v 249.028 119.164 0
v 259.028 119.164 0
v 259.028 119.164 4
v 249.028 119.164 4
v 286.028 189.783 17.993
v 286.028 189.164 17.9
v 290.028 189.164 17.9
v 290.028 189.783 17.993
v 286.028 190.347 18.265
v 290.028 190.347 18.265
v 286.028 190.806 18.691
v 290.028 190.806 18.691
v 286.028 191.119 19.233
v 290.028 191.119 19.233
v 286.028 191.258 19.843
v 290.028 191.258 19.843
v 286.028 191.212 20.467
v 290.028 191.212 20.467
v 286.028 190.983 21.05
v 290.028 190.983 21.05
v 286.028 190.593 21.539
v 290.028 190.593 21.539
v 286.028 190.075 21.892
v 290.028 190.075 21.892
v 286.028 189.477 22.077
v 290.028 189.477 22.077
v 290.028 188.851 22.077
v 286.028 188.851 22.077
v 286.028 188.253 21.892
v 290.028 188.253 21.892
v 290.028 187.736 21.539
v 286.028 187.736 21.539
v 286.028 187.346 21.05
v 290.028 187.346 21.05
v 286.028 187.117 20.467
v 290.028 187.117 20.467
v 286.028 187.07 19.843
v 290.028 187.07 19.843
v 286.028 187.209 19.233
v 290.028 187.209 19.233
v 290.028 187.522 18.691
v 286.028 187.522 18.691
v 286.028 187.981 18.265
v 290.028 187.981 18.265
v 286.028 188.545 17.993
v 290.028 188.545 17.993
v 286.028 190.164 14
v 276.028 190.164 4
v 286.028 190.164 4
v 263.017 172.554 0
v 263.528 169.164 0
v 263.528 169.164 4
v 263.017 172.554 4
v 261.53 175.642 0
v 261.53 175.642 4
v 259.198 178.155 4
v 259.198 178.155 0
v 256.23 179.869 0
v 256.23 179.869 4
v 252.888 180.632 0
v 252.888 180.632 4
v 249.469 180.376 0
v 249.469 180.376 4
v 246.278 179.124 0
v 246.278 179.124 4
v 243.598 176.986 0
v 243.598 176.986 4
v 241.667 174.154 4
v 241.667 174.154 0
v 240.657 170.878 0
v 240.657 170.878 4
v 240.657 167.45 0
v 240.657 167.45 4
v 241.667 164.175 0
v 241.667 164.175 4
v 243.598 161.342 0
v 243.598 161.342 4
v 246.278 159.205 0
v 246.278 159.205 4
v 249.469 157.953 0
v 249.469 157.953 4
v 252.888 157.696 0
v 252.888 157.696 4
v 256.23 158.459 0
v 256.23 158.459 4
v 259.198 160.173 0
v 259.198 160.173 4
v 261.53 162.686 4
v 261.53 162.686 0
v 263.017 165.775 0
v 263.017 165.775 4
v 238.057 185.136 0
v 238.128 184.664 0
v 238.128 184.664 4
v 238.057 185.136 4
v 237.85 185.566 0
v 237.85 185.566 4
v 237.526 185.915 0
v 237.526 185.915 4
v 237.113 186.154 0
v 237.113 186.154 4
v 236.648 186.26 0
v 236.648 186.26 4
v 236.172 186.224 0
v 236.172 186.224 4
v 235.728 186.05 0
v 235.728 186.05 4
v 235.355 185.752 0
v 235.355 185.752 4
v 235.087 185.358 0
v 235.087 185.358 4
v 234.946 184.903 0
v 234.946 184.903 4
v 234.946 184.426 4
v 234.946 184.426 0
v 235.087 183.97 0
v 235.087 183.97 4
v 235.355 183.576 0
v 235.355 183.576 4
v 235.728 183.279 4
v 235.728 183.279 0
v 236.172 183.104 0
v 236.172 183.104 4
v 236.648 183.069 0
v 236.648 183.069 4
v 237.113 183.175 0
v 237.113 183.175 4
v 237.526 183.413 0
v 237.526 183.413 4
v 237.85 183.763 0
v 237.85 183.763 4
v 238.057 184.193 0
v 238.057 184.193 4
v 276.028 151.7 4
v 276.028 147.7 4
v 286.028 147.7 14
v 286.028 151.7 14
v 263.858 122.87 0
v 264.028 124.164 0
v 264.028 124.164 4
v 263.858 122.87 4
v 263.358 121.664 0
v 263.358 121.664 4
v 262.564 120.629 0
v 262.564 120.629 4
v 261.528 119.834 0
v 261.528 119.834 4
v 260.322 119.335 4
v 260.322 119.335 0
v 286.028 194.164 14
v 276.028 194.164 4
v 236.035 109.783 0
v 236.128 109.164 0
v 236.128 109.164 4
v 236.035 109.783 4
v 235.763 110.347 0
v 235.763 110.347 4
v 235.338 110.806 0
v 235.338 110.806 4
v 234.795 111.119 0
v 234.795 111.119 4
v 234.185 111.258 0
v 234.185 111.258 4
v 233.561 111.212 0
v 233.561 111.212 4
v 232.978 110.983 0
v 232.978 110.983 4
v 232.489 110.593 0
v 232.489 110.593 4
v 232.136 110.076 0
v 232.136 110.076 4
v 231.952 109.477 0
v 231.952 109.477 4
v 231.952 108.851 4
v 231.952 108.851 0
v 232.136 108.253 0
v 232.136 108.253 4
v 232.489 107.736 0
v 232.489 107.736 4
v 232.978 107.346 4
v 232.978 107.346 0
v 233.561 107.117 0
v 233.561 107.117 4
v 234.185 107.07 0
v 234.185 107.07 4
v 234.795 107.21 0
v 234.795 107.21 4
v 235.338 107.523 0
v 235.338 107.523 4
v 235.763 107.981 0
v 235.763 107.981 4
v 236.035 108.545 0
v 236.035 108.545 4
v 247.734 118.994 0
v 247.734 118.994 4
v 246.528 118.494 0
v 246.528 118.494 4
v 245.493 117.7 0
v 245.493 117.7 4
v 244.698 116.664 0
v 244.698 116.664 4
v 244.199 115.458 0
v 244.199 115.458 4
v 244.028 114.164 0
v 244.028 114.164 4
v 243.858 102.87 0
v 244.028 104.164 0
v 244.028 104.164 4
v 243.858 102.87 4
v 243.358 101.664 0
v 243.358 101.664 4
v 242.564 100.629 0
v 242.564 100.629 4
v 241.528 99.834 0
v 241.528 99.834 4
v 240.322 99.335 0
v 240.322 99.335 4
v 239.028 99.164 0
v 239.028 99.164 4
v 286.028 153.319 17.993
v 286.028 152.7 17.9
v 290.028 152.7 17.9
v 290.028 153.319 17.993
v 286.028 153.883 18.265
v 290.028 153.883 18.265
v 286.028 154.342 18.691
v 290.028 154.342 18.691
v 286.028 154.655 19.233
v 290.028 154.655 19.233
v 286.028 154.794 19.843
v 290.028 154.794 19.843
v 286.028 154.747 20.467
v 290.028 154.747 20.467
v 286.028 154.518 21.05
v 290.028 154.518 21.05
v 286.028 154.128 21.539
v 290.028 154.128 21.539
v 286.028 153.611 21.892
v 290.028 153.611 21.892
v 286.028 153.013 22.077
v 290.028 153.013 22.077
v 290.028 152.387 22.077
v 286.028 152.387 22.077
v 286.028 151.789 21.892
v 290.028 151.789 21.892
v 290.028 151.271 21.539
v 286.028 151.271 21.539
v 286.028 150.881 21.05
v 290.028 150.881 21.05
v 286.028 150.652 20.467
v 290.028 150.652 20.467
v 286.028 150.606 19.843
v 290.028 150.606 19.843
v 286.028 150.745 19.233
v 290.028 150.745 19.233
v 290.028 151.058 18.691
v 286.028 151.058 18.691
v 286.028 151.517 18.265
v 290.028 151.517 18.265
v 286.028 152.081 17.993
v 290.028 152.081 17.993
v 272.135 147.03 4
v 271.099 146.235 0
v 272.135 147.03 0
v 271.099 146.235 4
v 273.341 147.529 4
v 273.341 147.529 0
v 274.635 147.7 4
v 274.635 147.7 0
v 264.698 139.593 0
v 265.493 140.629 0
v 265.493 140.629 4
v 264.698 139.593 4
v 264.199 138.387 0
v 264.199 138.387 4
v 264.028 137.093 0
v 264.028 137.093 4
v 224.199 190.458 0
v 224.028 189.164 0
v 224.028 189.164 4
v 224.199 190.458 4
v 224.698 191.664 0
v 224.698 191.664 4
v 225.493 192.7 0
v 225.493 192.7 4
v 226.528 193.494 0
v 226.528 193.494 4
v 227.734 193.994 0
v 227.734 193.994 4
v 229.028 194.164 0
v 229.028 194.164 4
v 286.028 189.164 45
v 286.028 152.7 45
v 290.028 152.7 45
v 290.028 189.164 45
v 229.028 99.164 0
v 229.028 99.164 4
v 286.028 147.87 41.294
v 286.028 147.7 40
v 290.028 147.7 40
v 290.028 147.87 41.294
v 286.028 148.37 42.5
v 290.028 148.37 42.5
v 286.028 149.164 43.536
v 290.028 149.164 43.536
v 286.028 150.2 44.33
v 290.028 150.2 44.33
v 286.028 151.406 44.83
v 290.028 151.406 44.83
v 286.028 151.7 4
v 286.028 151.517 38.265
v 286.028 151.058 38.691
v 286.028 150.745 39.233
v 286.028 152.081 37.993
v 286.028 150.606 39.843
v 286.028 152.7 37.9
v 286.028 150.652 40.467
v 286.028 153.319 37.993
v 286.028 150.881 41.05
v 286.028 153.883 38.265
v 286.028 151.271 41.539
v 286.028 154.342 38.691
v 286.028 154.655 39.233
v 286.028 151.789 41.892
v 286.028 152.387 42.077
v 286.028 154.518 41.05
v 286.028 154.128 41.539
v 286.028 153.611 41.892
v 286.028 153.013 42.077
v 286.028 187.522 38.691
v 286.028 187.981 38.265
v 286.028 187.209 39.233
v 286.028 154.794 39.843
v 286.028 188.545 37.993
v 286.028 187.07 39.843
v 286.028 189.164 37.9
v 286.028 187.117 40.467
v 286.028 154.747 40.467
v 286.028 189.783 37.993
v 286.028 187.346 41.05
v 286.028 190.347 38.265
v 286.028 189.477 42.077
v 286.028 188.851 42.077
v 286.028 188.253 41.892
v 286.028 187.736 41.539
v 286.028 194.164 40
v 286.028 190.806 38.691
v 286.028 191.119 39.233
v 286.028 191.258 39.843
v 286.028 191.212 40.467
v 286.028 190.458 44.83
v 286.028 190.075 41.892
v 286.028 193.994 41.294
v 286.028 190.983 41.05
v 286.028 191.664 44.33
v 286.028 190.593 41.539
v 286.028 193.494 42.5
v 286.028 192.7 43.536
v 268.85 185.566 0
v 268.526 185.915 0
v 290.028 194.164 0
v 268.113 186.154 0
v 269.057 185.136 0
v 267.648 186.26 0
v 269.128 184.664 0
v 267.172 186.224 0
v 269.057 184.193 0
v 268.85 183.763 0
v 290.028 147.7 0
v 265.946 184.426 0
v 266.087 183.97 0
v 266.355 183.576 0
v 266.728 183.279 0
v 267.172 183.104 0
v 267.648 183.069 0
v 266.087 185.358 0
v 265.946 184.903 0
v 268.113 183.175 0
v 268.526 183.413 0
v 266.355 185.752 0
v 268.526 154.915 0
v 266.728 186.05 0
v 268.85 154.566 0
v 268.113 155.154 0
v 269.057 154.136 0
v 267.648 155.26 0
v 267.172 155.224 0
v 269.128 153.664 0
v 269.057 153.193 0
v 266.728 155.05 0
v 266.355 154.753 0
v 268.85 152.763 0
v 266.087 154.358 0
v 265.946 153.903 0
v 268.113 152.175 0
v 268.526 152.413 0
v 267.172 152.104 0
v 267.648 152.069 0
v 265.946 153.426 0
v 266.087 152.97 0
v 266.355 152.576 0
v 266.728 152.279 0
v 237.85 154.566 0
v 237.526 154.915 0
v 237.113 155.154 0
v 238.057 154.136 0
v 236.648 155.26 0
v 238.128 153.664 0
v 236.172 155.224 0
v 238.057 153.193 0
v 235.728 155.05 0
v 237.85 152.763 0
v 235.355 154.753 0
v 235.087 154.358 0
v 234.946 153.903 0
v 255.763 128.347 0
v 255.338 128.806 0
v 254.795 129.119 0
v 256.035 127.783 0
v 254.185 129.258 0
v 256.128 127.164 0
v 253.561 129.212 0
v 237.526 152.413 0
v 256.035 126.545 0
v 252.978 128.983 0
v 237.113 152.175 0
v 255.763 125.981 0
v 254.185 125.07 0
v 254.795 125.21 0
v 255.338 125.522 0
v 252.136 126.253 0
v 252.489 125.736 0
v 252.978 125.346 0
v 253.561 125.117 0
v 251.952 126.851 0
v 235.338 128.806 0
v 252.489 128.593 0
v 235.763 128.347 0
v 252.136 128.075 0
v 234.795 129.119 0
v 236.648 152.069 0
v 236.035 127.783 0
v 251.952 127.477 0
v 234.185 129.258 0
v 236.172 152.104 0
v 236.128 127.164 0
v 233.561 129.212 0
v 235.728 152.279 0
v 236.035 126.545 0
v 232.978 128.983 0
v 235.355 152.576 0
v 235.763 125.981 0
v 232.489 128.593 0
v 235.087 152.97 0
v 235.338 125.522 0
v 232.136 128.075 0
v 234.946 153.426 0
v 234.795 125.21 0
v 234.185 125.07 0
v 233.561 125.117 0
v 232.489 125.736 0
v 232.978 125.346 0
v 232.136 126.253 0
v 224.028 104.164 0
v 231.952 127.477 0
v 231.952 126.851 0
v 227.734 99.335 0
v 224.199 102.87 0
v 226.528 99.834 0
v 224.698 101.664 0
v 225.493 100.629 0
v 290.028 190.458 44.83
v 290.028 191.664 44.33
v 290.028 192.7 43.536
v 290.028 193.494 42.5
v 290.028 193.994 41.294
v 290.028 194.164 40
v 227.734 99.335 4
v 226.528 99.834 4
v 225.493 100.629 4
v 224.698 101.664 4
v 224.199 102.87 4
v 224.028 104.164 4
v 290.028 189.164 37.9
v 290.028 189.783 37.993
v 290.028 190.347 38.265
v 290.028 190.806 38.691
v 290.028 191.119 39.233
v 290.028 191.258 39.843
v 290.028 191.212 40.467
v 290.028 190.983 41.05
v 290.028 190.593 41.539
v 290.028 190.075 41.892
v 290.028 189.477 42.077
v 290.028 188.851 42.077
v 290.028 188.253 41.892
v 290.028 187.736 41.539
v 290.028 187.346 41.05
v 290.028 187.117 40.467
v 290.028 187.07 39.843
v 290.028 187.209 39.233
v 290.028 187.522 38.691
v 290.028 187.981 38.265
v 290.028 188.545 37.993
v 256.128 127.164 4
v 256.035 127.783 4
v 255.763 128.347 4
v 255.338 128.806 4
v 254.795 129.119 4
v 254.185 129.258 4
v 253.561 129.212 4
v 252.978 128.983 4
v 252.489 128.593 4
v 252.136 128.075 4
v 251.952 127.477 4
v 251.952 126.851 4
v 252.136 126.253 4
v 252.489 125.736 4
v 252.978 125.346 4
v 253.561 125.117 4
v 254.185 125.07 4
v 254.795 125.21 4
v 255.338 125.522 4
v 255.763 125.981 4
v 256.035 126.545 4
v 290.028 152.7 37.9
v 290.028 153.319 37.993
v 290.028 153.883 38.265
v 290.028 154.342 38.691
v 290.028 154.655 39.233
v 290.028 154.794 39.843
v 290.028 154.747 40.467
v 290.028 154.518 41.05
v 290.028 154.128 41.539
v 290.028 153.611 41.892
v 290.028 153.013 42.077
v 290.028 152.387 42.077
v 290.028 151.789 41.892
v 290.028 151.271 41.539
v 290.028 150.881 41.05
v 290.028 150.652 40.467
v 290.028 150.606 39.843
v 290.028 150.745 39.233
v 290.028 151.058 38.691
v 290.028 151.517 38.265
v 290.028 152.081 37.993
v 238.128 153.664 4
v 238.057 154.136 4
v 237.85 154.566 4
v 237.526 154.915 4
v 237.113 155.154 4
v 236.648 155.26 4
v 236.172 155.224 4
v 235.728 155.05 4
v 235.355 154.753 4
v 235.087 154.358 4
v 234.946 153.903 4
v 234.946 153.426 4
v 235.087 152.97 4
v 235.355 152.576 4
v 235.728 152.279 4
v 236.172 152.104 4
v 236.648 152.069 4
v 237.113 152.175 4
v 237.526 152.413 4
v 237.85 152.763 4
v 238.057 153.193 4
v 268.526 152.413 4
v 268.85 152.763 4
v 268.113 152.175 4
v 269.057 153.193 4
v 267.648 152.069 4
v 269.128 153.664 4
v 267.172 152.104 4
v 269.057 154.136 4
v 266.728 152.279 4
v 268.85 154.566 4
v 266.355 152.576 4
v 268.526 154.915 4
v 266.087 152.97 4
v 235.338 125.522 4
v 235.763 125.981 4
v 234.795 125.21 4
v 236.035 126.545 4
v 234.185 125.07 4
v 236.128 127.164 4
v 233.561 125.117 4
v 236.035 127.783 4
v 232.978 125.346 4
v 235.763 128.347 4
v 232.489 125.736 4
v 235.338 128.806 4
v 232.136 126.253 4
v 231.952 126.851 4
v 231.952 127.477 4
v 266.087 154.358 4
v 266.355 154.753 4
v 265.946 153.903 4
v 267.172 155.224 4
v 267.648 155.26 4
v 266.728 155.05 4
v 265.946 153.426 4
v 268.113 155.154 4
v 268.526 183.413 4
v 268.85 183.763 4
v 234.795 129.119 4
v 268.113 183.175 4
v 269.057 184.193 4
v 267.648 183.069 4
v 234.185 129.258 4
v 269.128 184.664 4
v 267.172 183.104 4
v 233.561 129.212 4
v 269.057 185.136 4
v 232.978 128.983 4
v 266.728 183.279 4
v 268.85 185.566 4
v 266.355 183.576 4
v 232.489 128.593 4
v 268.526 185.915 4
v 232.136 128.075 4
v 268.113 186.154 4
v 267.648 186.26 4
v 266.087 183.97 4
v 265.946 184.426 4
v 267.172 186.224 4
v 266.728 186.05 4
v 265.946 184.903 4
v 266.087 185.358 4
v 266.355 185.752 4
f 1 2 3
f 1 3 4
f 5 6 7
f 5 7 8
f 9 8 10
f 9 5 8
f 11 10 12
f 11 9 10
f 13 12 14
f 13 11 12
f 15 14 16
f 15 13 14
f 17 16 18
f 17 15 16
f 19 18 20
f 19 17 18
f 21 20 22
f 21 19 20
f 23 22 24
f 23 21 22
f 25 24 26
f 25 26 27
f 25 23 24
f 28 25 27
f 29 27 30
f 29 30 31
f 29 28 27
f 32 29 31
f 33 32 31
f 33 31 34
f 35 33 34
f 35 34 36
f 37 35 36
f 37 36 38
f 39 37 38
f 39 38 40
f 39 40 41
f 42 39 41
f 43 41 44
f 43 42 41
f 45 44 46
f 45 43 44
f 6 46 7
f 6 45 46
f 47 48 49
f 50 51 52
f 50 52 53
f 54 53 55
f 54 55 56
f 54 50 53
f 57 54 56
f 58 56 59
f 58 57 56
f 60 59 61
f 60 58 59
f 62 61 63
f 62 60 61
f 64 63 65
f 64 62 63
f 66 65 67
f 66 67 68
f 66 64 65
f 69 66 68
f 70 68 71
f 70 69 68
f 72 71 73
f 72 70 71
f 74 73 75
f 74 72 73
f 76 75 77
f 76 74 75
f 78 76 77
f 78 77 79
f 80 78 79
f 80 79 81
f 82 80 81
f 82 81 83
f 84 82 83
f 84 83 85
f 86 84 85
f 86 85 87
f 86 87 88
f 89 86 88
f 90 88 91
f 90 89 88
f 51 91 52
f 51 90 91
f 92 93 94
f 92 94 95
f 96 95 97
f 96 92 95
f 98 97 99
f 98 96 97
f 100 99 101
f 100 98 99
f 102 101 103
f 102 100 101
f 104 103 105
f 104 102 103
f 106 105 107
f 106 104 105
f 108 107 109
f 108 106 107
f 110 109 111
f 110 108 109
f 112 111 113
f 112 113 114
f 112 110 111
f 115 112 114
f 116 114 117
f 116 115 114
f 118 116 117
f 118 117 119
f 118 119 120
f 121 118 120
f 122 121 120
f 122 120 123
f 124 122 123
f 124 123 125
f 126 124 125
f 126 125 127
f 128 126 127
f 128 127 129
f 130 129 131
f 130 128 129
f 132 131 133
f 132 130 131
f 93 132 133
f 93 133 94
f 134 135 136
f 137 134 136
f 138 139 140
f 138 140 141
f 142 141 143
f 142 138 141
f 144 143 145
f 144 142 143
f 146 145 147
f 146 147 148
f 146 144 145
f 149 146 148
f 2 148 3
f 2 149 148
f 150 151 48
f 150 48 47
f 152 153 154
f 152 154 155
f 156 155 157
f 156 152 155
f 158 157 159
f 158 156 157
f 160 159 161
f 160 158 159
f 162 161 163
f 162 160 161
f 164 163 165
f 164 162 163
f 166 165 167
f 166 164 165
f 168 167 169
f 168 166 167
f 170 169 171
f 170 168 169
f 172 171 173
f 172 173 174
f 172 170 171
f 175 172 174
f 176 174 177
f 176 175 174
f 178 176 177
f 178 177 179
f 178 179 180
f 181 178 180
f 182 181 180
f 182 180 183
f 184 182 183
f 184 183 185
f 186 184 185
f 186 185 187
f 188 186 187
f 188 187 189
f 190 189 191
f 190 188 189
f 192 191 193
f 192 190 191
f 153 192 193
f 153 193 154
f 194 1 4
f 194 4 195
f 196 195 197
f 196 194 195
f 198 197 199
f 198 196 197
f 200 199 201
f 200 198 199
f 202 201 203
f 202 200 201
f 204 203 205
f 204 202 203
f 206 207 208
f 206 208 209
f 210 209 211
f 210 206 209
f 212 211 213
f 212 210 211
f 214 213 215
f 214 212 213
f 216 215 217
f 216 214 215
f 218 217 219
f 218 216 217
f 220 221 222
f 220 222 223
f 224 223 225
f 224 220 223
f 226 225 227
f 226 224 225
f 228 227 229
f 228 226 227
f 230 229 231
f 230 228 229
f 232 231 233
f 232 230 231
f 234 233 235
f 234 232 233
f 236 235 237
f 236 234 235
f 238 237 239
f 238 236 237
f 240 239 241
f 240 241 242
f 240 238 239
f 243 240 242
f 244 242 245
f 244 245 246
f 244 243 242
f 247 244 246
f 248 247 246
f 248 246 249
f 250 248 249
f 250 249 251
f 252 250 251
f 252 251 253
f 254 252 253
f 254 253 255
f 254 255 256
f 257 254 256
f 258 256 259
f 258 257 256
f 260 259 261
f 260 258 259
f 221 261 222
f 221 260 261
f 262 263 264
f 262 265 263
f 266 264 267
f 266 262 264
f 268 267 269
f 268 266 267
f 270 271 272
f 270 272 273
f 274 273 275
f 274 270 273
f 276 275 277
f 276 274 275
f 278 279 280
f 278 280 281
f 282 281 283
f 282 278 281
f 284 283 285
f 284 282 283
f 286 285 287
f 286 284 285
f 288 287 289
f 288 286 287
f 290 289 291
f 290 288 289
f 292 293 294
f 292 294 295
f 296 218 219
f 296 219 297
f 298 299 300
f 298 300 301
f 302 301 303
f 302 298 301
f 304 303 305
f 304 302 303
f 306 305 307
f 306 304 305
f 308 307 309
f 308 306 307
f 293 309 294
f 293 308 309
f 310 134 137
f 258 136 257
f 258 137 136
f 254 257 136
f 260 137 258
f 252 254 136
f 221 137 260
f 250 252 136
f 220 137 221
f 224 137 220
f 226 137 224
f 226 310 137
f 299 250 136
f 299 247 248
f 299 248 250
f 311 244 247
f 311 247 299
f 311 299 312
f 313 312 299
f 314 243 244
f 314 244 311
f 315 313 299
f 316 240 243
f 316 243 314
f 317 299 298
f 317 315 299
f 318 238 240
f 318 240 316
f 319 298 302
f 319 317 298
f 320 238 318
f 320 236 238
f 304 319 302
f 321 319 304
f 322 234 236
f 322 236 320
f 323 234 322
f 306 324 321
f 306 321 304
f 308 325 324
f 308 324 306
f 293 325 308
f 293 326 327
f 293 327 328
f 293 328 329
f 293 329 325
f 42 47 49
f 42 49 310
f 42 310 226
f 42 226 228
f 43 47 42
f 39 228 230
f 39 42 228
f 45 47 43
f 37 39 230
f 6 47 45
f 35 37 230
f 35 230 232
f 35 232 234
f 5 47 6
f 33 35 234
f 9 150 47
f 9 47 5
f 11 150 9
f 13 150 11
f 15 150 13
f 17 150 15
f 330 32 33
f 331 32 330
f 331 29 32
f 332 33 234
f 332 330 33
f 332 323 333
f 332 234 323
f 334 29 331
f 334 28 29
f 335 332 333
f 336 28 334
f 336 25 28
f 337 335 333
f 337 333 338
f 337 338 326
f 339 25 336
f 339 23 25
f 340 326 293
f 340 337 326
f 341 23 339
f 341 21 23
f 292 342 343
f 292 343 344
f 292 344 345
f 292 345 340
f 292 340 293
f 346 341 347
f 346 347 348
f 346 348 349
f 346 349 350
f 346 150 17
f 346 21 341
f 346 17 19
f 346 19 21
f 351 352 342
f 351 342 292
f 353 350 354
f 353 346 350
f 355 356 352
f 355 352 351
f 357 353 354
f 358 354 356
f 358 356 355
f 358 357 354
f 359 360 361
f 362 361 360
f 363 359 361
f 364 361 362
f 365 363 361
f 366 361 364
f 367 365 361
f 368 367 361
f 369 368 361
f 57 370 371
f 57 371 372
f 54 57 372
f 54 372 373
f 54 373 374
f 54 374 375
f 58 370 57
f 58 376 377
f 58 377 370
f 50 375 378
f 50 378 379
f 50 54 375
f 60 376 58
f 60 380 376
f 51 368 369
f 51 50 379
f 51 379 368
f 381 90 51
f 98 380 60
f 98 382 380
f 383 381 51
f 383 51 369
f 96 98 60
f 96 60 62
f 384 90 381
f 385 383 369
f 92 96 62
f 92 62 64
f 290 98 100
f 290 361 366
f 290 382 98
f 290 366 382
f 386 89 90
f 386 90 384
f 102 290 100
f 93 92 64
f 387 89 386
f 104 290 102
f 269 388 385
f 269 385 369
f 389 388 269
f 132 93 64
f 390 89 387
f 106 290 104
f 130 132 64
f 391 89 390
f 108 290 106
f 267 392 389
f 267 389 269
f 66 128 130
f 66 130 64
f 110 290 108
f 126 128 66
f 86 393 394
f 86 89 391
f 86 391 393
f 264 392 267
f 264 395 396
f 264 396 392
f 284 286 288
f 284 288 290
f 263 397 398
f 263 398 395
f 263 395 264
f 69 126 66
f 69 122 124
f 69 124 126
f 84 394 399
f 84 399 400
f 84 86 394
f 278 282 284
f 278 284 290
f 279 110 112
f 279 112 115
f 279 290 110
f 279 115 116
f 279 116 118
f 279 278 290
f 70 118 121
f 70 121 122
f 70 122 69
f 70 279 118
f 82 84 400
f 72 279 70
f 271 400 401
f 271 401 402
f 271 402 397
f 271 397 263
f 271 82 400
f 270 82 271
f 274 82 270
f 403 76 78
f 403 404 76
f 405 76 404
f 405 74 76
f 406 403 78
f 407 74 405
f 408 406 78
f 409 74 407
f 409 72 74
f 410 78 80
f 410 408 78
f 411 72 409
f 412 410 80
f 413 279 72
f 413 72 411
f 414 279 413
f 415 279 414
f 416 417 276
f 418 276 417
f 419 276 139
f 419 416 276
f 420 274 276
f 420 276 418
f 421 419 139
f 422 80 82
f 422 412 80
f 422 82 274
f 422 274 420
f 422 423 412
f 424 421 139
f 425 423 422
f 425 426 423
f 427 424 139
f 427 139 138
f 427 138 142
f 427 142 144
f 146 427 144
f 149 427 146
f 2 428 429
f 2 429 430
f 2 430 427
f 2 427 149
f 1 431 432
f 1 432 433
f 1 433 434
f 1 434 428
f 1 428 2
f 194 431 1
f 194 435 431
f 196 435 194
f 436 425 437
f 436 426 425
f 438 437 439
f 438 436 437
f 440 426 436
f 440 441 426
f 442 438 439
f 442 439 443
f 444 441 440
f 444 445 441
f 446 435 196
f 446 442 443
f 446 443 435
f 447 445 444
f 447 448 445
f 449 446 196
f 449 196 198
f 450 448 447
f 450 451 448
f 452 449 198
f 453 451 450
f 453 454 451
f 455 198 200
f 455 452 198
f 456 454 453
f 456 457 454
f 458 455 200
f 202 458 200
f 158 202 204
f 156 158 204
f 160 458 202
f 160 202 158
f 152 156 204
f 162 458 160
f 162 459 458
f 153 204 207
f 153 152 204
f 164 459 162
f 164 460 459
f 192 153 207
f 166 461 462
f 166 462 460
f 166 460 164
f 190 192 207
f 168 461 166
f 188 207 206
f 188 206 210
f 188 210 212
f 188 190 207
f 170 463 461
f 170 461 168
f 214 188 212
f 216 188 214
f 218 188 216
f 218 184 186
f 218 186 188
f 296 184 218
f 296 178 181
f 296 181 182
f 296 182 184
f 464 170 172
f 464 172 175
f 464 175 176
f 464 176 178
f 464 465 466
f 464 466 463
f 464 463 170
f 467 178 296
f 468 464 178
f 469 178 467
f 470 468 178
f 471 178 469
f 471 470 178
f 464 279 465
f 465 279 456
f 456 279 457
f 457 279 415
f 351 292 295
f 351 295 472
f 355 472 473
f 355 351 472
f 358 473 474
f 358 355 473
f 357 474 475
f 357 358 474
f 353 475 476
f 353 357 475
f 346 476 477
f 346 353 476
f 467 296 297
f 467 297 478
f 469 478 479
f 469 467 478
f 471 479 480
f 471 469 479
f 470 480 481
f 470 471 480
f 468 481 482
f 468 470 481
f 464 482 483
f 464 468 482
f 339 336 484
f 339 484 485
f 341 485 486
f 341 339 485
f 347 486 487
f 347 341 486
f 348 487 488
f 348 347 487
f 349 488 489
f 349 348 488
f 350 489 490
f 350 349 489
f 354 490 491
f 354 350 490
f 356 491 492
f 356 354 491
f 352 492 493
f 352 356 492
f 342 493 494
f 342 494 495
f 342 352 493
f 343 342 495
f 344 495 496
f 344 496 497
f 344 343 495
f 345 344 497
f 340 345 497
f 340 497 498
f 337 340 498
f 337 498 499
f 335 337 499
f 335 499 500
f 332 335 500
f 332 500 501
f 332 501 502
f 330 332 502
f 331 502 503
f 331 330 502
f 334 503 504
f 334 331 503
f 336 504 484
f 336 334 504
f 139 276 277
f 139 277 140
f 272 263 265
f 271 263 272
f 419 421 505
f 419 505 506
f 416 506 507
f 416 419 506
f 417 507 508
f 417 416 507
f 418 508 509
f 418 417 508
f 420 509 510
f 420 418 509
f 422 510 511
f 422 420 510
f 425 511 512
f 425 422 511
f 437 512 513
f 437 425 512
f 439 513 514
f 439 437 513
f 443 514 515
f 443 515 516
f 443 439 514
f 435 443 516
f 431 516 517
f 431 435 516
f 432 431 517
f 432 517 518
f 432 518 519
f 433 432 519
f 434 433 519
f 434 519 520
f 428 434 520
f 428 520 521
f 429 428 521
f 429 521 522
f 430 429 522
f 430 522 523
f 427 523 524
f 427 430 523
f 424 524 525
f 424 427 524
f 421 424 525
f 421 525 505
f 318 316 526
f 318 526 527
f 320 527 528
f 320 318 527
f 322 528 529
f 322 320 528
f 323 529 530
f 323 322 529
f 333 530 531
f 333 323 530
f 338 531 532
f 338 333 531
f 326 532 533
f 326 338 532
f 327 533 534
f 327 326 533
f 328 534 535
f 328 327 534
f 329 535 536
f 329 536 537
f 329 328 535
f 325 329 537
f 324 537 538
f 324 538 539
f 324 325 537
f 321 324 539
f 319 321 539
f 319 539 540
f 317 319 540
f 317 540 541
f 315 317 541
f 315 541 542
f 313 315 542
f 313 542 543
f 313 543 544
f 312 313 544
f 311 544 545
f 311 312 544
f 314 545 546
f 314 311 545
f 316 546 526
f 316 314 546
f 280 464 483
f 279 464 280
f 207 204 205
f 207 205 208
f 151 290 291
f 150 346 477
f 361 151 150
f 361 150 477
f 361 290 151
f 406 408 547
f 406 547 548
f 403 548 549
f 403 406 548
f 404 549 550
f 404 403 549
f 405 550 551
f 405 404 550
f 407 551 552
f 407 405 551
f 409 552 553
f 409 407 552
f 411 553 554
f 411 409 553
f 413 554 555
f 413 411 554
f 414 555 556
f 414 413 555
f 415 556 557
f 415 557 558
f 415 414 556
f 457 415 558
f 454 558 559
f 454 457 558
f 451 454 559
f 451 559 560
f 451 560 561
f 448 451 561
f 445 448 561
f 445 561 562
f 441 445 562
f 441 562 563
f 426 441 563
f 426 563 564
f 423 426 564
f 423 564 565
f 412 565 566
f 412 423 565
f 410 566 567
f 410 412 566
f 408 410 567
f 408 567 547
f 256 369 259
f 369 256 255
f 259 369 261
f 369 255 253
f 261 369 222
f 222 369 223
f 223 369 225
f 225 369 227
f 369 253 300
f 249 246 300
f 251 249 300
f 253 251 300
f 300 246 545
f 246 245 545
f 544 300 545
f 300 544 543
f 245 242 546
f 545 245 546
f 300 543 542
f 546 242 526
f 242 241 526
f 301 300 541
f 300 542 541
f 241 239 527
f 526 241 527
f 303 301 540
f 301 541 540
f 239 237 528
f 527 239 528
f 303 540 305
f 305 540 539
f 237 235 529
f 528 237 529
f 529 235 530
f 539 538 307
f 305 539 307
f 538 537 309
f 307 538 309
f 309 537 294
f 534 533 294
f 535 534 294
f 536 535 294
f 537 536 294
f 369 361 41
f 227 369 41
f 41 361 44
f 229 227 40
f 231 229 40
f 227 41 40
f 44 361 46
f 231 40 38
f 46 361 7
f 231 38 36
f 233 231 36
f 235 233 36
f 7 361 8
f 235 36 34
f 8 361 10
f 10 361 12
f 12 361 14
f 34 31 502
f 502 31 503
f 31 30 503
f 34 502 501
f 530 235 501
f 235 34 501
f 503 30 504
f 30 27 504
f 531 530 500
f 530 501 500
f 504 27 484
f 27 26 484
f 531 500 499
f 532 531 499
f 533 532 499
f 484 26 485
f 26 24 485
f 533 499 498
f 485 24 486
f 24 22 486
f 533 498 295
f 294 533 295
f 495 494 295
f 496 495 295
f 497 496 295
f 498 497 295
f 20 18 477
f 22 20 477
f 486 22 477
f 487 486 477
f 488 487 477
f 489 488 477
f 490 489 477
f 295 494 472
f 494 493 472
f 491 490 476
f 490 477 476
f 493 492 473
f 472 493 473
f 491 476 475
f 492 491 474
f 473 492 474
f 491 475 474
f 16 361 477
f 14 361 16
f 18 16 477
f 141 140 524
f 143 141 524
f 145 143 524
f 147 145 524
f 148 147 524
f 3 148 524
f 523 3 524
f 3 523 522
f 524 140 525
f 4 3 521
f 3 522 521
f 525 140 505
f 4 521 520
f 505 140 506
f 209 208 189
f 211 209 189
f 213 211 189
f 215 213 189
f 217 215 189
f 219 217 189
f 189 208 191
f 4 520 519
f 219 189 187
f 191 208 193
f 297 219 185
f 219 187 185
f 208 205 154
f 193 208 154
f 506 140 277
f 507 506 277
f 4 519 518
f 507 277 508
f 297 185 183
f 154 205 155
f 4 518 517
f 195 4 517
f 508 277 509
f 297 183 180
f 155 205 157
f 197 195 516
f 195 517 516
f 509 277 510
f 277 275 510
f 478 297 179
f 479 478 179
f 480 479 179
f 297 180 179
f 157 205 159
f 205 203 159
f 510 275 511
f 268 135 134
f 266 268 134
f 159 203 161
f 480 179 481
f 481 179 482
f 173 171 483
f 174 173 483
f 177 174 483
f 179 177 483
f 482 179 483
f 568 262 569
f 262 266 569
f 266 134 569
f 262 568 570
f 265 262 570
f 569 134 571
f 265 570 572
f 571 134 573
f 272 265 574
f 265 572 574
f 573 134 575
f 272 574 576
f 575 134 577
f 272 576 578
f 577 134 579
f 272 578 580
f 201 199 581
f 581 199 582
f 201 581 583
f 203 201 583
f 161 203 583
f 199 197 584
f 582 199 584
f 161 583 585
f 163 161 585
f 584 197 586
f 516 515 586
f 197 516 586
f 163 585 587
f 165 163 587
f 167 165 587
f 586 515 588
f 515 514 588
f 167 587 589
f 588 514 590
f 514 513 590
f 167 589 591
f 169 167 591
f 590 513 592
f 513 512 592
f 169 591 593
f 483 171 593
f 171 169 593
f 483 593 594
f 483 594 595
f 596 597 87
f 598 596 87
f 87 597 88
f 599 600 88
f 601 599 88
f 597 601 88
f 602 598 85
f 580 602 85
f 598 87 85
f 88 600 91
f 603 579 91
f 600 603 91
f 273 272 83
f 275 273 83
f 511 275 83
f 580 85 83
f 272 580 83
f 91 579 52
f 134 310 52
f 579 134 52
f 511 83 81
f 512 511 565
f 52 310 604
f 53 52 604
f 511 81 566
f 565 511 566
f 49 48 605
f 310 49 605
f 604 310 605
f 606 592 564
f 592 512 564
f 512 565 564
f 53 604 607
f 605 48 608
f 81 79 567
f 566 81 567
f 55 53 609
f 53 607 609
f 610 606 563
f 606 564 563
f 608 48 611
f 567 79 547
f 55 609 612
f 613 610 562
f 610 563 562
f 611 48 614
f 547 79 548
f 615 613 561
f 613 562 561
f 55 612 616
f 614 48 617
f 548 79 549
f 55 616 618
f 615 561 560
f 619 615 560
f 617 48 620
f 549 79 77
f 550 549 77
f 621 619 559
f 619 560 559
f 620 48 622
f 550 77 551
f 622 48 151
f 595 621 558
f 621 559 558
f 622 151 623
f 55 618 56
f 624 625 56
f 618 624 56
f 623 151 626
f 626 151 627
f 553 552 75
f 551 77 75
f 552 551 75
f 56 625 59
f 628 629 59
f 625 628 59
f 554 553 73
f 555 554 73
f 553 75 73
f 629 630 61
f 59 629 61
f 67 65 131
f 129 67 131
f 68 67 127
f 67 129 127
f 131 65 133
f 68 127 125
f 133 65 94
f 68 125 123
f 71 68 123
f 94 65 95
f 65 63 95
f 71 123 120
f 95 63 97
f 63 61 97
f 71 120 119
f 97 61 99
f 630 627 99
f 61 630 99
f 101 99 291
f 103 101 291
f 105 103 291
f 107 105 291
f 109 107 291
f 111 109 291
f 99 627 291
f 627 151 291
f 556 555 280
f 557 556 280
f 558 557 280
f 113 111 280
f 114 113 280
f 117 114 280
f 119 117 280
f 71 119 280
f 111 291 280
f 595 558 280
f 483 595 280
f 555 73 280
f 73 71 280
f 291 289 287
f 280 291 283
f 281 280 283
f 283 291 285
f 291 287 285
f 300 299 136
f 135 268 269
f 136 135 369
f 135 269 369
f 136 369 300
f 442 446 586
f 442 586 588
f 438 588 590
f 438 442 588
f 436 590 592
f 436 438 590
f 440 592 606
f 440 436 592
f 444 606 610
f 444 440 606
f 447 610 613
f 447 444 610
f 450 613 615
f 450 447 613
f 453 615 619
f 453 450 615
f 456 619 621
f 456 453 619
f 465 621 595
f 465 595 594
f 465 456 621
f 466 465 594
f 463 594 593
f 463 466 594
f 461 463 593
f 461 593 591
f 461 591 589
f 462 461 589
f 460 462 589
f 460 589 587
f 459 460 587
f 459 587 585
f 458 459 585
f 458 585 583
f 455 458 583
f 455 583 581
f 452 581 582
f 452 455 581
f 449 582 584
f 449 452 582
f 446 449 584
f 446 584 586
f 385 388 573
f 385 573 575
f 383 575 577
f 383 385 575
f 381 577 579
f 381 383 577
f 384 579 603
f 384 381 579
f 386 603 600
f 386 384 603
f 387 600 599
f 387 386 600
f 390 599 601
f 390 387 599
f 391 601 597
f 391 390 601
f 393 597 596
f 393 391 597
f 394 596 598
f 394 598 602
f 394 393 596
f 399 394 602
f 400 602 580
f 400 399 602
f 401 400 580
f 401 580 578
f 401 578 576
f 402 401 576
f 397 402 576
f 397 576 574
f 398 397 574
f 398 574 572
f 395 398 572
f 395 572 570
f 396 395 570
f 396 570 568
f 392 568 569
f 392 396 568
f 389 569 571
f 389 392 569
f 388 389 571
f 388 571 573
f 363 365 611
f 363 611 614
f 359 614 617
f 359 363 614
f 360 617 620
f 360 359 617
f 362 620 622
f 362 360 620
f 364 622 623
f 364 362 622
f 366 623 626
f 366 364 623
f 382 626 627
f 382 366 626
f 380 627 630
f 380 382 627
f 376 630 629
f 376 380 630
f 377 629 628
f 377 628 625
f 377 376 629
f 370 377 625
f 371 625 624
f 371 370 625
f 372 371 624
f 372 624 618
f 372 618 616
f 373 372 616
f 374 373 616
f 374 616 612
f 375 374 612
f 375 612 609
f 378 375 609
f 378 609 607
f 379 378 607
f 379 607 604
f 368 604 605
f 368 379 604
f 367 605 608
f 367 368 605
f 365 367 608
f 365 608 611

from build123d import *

# Parameters (mm, degrees)
MODEL_R         = 1.5999968
MODEL_R_2       = 2.0999958
MODEL_R_3       = 11.499977
EXTRUDE_1_DEPTH = 4
EXTRUDE_2_DEPTH = 4
FILLET_1_R      = 5
SKETCH_2_R      = 2.1
EXTRUDE_3_DEPTH = 4
EXTRUDE_4_DEPTH = 4


with BuildPart() as part:
    # Model → Бобышка-Вытянуть1 (new body)
    with BuildSketch(Plane.XY):
        with BuildLine():
            Line((274.028195208, 189.164211852), (274.028195208, 151.235355522))
            ThreePointArc((274.028195208, 151.235355522), (273.647593631, 149.321942187), (272.563732042, 147.699828687))
            Line((272.563732042, 147.699828687), (265.492678373, 140.628775017))
            ThreePointArc((265.492678373, 140.628775017), (264.408816784, 139.006661518), (264.028215208, 137.093248183))
            Line((264.028215208, 137.093248183), (264.028215208, 124.164341852))
            ThreePointArc((264.028215208, 124.164341852), (262.563752042, 120.628815017), (259.028225208, 119.164351852))
            Line((259.028225208, 119.164351852), (249.028245208, 119.164351852))
            ThreePointArc((249.028245208, 119.164351852), (245.492718373, 117.699888687), (244.028255208, 114.164361852))
            Line((244.028255208, 114.164361852), (244.028255208, 104.164381852))
            ThreePointArc((244.028255208, 104.164381852), (242.563792042, 100.628855017), (239.028265208, 99.164391852))
            Line((239.028265208, 99.164391852), (229.028285208, 99.164391852))
            ThreePointArc((229.028285208, 99.164391852), (225.492758373, 100.628855017), (224.028295208, 104.164381852))
            Line((224.028295208, 104.164381852), (224.028295208, 189.164211852))
            ThreePointArc((224.028295208, 189.164211852), (225.492758373, 192.699738687), (229.028285208, 194.164201852))
            Line((229.028285208, 194.164201852), (269.028205208, 194.164201852))
            ThreePointArc((269.028205208, 194.164201852), (272.563732043, 192.699738687), (274.028195208, 189.164211852))
        make_face()
        with Locations((267.528208208, 184.664220852)):
            Circle(MODEL_R, mode=Mode.SUBTRACT)
        with Locations((267.528208208, 153.664282852)):
            Circle(MODEL_R, mode=Mode.SUBTRACT)
        with Locations((236.528270208, 153.664282852)):
            Circle(MODEL_R, mode=Mode.SUBTRACT)
        with Locations((236.528270208, 184.664220852)):
            Circle(MODEL_R, mode=Mode.SUBTRACT)
        with Locations((254.028235208, 127.164335852)):
            Circle(MODEL_R_2, mode=Mode.SUBTRACT)
        with Locations((234.028275208, 127.164335852)):
            Circle(MODEL_R_2, mode=Mode.SUBTRACT)
        with Locations((234.028275208, 109.164371852)):
            Circle(MODEL_R_2, mode=Mode.SUBTRACT)
        with Locations((252.028239208, 169.164251852)):
            Circle(MODEL_R_3, mode=Mode.SUBTRACT)
    extrude(amount=EXTRUDE_1_DEPTH)

    # Эскиз1 → Бобышка-Вытянуть2 (add)
    with BuildSketch(Plane(origin=(0, 0, 0), x_dir=(-1, 0, 0), z_dir=(0, 0, -1))):
        Polygon((-274.028195208, 194.164201852), (-286.028195208, 194.164201852), (-286.028195208, 147.699828687), (-274.028195208, 147.699828687), (-271.528200208, 147.699828687), (-271.528200208, 152.064286052), (-274.028195208, 152.064286052), (-274.028195208, 189.164211852), (-269.028205208, 189.164211852), (-269.028205208, 194.164201852), align=None)
    extrude(amount=-EXTRUDE_2_DEPTH)

    # Скругление1
    fillet_1_edges = [part.edges().sort_by_distance(p)[0] for p in [
        (272.563732042, 147.699828687, 2),
    ]]
    fillet(fillet_1_edges, radius=FILLET_1_R)

    # Эскиз2 → Бобышка-Вытянуть3 (add)
    with BuildSketch(Plane(origin=(286.028195208, 0, 0), x_dir=(0, 0, -1), z_dir=(1, 0, 0))):
        with BuildLine():
            Line((0, 147.699828687), (-40, 147.699828687))
            ThreePointArc((-40, 147.699828687), (-43.535533906, 149.164294781), (-45, 152.699828687))
            Line((-45, 152.699828687), (-45, 189.164201852))
            ThreePointArc((-45, 189.164201852), (-43.535533906, 192.699735758), (-40, 194.164201852))
            Line((-40, 194.164201852), (0, 194.164201852))
            Line((0, 194.164201852), (0, 147.699828687))
        make_face()
        with Locations((-40, 189.164201852)):
            Circle(SKETCH_2_R, mode=Mode.SUBTRACT)
        with Locations((-40, 152.699828687)):
            Circle(SKETCH_2_R, mode=Mode.SUBTRACT)
        with Locations((-20, 189.164201852)):
            Circle(SKETCH_2_R, mode=Mode.SUBTRACT)
        with Locations((-20, 152.699828687)):
            Circle(SKETCH_2_R, mode=Mode.SUBTRACT)
    extrude(amount=EXTRUDE_3_DEPTH)

    # Эскиз3 → Бобышка-Вытянуть4 (add)
    with BuildSketch(Plane(origin=(0, 194.164201852, 0), x_dir=(1, 0, 0), z_dir=(0, 1, 0))):
        Polygon((286.028195208, -4), (276.028195208, -4), (286.028195208, -14), align=None)
    extrude_4 = extrude(amount=-EXTRUDE_4_DEPTH)

    # Зеркальное отражение1: Бобышка-Вытянуть4 across plane
    add(extrude_4.mirror(Plane.ZX.offset(170.93201527)))


solid = part.part
